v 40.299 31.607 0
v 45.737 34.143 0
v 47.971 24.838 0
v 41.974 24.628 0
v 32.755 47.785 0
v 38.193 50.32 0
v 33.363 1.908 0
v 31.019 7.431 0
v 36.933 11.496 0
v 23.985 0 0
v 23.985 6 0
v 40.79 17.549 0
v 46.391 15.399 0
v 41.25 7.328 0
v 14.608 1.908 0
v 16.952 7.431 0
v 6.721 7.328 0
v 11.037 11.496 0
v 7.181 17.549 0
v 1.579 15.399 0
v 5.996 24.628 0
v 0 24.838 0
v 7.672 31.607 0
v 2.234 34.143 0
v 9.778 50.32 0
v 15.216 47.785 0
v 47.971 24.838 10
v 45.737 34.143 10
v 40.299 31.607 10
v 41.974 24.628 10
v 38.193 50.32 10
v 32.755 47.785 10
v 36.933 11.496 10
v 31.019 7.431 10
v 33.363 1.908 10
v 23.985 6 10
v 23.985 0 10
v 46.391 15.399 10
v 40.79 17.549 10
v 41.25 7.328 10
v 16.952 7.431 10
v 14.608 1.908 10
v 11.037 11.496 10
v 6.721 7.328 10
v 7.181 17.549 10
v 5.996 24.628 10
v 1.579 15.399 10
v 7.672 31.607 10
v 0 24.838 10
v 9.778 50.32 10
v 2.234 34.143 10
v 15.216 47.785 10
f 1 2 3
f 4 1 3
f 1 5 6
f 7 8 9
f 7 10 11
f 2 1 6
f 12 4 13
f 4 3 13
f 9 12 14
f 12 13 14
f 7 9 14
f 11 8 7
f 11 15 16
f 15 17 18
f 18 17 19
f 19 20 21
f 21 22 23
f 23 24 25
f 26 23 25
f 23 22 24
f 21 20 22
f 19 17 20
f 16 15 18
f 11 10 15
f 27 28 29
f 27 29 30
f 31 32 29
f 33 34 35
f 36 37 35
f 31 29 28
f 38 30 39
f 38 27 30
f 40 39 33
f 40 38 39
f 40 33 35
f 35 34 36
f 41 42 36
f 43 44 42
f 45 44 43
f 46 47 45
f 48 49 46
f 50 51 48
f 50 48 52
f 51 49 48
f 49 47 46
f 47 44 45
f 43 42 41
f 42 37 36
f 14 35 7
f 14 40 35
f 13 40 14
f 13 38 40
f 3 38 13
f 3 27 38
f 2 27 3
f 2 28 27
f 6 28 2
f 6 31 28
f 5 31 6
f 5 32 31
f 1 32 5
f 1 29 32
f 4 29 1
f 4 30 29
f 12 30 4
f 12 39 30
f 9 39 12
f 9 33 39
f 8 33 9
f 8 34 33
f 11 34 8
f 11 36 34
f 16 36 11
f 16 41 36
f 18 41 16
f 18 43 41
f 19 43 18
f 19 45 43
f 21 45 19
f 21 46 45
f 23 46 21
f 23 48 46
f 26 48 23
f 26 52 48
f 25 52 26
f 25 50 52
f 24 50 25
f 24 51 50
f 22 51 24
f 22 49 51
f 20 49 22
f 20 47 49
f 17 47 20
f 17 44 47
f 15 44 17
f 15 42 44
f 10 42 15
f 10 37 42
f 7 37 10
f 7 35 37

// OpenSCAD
$fn = 32;

// ----------------------------------------------------------------------
// Clip blank: omega clip, 10 mm thick
// ----------------------------------------------------------------------

// --- parameters (mm) ---
profile_height = 10;      // extrusion height
profile_points = 26;      // points of the closed outline

profile = [[2.234, 34.143], [0, 24.838], [1.579, 15.399], [6.721, 7.328], [14.608, 1.908], [23.985, 0], [33.363, 1.908], [41.25, 7.328], [46.391, 15.399], [47.971, 24.838], [45.737, 34.143], [38.193, 50.32], [32.755, 47.785], [40.299, 31.607], [41.974, 24.628], [40.79, 17.549], [36.933, 11.496], [31.019, 7.431], [23.985, 6], [16.952, 7.431], [11.037, 11.496], [7.181, 17.549], [5.996, 24.628], [7.672, 31.607], [15.216, 47.785], [9.778, 50.32]];  // single closed polygon, 26 points, counter clockwise

// --- the one profile operation ---
linear_extrude(height = profile_height) polygon(points = profile);
